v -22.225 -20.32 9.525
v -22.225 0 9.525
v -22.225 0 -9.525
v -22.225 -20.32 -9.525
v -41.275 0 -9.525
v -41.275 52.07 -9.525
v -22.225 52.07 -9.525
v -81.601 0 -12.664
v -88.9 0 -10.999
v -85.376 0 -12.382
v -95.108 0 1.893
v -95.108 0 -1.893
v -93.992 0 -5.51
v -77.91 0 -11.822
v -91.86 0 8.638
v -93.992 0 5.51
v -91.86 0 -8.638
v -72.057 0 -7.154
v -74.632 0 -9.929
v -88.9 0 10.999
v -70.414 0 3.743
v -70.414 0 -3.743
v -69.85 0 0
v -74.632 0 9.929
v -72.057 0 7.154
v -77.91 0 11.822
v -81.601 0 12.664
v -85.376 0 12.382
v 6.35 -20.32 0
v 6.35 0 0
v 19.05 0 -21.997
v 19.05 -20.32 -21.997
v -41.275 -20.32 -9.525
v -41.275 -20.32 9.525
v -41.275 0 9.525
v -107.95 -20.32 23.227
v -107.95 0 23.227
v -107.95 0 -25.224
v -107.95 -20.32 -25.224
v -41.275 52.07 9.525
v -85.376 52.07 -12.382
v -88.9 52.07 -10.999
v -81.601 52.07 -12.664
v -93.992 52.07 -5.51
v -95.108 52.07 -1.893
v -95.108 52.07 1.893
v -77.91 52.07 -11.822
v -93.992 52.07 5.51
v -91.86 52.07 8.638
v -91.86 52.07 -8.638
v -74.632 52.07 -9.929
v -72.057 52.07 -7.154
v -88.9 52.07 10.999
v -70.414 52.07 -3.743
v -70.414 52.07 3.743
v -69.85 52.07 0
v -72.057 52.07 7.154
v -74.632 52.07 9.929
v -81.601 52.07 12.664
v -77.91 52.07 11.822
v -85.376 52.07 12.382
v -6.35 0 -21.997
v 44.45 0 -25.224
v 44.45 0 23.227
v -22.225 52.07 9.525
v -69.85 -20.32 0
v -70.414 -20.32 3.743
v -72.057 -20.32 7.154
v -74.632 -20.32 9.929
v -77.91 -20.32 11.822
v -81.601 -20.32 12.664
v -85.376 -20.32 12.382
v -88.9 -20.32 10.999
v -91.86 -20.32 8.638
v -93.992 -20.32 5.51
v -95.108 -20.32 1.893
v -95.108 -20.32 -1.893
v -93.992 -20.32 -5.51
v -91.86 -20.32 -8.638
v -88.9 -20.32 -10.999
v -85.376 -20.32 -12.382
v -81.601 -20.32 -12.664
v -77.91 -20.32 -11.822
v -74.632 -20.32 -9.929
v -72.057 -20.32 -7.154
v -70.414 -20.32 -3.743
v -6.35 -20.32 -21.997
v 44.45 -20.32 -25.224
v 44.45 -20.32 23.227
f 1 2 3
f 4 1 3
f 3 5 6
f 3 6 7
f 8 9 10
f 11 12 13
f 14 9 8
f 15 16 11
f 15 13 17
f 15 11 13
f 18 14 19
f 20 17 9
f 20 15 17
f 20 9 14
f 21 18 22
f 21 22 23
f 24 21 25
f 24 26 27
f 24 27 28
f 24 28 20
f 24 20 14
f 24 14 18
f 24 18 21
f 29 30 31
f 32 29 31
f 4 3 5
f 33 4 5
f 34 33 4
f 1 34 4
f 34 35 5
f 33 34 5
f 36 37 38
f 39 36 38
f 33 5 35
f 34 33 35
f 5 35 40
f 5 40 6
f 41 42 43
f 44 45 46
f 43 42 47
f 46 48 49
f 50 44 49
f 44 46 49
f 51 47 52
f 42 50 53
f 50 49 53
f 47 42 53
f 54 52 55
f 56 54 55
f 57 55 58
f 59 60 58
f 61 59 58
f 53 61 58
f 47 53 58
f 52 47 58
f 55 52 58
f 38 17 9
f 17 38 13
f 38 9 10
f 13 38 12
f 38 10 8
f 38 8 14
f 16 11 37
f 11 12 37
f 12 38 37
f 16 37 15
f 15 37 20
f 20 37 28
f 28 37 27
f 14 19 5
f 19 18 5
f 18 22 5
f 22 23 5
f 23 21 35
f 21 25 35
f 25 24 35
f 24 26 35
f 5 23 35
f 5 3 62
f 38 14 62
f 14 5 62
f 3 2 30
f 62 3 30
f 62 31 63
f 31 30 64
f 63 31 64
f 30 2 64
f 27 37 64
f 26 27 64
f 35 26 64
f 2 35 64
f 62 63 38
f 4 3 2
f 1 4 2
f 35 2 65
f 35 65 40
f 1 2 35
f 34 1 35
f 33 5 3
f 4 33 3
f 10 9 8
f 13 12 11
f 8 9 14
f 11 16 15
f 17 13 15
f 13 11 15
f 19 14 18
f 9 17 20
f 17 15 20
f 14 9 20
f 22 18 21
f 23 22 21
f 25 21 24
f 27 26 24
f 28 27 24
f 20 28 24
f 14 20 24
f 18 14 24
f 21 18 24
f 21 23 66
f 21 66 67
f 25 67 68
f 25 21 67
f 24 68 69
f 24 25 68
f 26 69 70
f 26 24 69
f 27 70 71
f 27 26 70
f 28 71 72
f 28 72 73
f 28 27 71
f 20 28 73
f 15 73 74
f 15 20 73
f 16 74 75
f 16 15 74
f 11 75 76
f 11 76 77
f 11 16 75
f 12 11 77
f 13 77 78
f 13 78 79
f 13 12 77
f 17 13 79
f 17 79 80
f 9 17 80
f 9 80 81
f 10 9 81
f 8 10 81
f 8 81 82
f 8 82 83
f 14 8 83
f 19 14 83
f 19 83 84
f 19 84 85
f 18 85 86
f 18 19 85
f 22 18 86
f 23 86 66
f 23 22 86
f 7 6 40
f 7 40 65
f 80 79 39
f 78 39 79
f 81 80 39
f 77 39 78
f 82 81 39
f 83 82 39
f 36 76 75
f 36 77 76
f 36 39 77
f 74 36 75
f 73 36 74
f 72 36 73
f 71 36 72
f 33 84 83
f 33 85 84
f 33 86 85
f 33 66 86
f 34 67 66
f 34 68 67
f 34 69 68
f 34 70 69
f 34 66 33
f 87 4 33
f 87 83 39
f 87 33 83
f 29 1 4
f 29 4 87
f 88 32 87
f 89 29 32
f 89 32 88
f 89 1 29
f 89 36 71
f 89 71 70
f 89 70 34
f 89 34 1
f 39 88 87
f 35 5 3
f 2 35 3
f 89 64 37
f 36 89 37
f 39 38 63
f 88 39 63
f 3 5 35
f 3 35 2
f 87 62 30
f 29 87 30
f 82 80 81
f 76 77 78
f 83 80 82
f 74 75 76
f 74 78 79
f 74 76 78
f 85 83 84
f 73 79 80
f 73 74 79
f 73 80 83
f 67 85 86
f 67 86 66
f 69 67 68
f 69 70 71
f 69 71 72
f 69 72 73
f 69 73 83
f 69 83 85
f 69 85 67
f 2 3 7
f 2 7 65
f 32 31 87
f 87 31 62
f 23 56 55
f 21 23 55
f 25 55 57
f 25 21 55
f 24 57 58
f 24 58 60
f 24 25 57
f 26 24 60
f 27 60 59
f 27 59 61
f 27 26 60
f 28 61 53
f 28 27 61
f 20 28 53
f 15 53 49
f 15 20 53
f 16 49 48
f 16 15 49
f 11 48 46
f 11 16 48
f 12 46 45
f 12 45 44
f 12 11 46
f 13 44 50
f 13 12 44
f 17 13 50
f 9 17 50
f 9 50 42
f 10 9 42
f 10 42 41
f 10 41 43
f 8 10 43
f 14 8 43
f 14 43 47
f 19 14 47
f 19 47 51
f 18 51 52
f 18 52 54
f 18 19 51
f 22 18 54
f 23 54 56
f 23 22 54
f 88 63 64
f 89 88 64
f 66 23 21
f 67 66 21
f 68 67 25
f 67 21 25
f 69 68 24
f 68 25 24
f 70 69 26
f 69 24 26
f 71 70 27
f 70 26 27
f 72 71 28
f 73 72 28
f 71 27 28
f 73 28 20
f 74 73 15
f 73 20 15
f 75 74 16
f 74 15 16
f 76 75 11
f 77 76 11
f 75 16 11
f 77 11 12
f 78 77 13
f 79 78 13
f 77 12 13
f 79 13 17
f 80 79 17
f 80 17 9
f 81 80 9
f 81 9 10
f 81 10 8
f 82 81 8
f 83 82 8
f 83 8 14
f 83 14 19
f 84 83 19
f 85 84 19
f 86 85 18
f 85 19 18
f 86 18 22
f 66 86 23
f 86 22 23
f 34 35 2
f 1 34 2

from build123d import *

# Parameters (mm, degrees)
F0_R     = 12.7
F1_DEPTH = 20.32
F2_DEPTH = 52.07
F3_DEPTH = 20.32


with BuildPart() as f1:
    # F0 (on Front) → F1 (new body)
    with BuildSketch(Plane.XZ):
        Polygon((44.45, -25.2242535353), (44.45, 0), (44.45, 23.2269223779), (-107.95, 23.2269223779), (-107.95, -25.2242535353), align=None)
        Polygon((-6.35, -21.9970452561), (6.35, 0), (19.05, -21.9970452561), align=None, mode=Mode.SUBTRACT)
        with Locations((-82.55, 0)):
            Circle(F0_R, mode=Mode.SUBTRACT)
        Polygon((-22.225, 9.525), (-22.225, 0), (-22.225, -9.525), (-41.275, -9.525), (-41.275, 0), (-41.275, 9.525), align=None, mode=Mode.SUBTRACT)
    extrude(amount=F1_DEPTH)


with BuildPart() as f2:
    # F0 (on Front) → F2 (new body)
    with BuildSketch(Plane.XZ):
        with Locations((-82.55, 0)):
            Circle(F0_R)
    extrude(amount=-F2_DEPTH)


with BuildPart() as f2b:
    # F0 (on Front) → F2, piece 2 (new body)
    with BuildSketch(Plane.XZ):
        Polygon((-22.225, -9.525), (-22.225, 0), (-31.75, 0), (-41.275, 0), (-41.275, -9.525), align=None)
        Polygon((-31.75, 0), (-22.225, 0), (-22.225, 9.525), (-41.275, 9.525), (-41.275, 0), align=None)
    extrude(amount=-F2_DEPTH)


with BuildPart() as f3:
    # F0 (on Front) → F3 (new body)
    with BuildSketch(Plane.XZ):
        with Locations((-82.55, 0)):
            Circle(F0_R)
    extrude(amount=F3_DEPTH)


with BuildPart() as f3b:
    # F0 (on Front) → F3, piece 2 (new body)
    with BuildSketch(Plane.XZ):
        Polygon((-22.225, -9.525), (-22.225, 0), (-31.75, 0), (-41.275, 0), (-41.275, -9.525), align=None)
        Polygon((-31.75, 0), (-22.225, 0), (-22.225, 9.525), (-41.275, 9.525), (-41.275, 0), align=None)
    extrude(amount=F3_DEPTH)


solid = Compound([f1.part, f2.part, f2b.part, f3.part, f3b.part])
